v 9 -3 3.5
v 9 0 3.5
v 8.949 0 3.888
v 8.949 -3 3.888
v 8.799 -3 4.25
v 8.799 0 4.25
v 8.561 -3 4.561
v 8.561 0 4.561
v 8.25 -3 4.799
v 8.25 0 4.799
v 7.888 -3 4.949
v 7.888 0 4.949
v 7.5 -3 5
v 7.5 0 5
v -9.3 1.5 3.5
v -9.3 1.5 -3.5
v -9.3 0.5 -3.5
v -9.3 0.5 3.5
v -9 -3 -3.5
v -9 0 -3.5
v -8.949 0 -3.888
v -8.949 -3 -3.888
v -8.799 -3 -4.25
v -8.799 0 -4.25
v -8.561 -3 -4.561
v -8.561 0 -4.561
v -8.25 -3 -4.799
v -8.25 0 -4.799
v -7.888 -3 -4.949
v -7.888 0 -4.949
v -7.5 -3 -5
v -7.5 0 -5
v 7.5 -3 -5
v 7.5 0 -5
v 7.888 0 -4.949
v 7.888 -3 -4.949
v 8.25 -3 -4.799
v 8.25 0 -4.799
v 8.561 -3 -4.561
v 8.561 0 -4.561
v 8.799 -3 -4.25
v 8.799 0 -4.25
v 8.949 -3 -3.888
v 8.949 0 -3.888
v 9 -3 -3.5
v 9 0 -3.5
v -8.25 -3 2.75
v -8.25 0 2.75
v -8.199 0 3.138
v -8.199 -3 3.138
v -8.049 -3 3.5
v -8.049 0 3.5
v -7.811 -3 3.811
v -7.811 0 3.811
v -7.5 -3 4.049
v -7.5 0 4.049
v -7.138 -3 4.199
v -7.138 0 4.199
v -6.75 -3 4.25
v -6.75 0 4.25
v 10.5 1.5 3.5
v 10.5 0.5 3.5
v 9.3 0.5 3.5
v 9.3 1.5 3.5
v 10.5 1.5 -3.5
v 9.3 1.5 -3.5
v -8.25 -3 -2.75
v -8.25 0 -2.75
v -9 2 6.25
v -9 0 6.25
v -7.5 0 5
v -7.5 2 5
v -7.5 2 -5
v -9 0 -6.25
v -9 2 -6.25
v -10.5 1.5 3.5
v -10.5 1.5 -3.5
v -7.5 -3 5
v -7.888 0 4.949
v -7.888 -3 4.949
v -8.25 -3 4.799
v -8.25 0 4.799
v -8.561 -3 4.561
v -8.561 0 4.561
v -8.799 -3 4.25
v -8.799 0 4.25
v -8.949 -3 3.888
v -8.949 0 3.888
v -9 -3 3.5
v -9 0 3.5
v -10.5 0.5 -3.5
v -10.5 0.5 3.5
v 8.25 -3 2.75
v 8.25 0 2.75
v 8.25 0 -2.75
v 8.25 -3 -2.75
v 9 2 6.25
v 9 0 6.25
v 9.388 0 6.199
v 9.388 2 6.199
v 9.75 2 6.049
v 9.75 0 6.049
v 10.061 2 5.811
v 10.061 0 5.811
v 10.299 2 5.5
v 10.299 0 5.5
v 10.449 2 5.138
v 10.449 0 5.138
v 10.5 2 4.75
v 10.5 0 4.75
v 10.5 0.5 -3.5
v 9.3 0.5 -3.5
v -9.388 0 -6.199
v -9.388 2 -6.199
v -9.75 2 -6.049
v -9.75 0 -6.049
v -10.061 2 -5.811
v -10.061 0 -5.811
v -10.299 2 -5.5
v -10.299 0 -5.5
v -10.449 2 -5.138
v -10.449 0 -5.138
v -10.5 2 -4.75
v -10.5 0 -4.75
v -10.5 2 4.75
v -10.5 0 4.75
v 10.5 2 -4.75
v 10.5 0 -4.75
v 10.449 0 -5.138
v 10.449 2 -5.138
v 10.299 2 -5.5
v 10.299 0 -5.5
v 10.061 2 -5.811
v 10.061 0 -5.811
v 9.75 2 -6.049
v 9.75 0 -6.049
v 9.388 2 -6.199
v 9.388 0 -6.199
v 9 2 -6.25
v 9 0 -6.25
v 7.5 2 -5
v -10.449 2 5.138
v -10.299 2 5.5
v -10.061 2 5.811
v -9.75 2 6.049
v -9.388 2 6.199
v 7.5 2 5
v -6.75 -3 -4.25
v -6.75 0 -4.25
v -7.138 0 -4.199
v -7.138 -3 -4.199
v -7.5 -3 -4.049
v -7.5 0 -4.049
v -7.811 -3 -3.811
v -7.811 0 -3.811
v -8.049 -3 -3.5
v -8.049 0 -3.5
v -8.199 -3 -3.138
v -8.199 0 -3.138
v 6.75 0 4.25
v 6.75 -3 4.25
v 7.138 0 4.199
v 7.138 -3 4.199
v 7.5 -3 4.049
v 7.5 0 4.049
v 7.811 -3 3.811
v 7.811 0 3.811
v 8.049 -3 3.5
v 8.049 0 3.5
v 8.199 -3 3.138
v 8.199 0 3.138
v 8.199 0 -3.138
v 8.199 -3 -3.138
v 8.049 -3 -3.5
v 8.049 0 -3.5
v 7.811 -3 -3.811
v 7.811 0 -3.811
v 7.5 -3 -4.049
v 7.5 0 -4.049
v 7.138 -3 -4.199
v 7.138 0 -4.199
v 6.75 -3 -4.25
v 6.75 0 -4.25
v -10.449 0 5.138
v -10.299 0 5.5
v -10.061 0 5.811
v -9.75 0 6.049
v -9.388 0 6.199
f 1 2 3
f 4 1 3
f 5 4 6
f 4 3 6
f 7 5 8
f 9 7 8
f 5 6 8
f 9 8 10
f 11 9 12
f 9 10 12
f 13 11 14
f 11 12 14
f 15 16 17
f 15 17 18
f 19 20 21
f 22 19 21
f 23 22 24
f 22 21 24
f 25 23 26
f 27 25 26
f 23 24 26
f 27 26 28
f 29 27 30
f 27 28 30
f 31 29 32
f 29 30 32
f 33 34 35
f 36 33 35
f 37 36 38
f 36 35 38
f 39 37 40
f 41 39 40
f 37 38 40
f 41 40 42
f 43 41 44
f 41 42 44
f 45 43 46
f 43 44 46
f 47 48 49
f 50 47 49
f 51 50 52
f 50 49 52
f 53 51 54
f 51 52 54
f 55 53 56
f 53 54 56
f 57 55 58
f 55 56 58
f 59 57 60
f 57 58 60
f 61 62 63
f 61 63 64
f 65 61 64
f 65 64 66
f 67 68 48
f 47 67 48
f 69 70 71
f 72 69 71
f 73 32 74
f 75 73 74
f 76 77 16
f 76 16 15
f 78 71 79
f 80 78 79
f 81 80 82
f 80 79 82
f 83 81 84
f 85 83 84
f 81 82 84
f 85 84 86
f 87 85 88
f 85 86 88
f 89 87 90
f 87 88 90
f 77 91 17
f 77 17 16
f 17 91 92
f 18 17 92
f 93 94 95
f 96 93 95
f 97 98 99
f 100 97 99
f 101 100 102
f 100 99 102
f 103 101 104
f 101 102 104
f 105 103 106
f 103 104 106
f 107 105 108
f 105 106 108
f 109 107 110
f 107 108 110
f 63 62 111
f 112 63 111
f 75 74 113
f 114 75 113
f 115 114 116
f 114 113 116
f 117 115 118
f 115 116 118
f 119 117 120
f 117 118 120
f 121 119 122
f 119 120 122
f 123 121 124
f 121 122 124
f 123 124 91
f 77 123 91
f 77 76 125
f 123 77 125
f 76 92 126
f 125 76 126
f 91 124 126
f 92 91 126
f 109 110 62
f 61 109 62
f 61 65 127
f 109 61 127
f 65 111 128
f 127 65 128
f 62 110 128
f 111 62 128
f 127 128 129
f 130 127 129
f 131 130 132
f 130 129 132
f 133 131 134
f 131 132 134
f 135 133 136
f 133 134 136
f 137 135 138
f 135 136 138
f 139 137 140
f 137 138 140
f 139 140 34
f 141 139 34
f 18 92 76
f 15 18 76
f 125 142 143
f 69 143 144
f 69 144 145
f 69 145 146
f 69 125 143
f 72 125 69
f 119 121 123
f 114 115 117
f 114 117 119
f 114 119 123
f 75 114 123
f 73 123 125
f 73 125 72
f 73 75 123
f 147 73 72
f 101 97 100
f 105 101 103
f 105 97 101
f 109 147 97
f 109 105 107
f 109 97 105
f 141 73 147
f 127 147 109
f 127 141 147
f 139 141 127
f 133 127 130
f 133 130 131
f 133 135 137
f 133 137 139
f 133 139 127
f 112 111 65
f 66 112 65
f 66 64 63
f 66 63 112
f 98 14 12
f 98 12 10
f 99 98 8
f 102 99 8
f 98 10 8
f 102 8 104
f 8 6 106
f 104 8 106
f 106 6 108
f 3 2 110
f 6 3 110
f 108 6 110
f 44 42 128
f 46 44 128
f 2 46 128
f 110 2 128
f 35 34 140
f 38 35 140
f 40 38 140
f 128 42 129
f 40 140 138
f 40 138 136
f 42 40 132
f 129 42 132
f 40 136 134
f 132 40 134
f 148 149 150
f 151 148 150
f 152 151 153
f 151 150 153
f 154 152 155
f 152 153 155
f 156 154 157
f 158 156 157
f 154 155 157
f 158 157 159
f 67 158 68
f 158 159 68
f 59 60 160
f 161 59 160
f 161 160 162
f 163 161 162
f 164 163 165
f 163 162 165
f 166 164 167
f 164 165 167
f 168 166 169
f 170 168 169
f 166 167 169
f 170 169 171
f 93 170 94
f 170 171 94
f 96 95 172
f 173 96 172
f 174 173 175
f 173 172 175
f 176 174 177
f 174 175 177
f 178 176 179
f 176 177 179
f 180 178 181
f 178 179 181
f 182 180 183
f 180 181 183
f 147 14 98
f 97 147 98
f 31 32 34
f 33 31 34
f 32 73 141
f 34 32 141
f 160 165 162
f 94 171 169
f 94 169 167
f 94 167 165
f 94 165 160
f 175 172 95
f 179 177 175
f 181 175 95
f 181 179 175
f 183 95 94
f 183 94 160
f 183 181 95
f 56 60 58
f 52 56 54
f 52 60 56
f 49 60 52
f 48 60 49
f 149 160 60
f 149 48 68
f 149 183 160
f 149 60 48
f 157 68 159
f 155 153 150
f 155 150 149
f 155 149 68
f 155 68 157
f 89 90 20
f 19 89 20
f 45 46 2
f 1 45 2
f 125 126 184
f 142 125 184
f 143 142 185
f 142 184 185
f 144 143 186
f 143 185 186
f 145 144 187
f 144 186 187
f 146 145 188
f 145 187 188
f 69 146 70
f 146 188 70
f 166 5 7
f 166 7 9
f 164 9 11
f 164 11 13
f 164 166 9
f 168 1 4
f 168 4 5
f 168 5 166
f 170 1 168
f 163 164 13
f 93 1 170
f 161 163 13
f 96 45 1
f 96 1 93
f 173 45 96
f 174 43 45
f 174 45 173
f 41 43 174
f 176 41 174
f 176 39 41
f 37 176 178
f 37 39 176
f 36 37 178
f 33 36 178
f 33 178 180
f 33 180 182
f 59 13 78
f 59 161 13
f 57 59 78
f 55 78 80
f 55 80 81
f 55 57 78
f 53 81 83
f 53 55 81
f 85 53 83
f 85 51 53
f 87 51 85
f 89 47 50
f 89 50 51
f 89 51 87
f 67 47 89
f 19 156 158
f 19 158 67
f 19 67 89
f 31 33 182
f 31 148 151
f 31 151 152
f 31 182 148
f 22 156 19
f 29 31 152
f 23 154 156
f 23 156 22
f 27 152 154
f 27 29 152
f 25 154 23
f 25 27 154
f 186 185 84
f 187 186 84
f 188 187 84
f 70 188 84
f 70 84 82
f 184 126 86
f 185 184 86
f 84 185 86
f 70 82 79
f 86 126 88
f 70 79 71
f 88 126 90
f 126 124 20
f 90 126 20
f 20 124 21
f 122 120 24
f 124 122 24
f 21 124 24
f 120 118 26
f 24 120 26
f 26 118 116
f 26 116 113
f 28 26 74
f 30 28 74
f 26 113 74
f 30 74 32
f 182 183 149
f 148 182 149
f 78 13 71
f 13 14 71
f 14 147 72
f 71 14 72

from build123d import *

# Parameters (mm, degrees)
BOSS_EXTRUDE1_DEPTH      = 2
BOSS_EXTRUDE1_DEPTH_BACK = 3
BOSS_EXTRUDE2_DEPTH      = 2
BOSS_EXTRUDE3_DEPTH      = 2
SKETCH3_W                = 7
SKETCH3_H                = 1
CUT_EXTRUDE2_DEPTH       = 1.2
SKETCH4_W                = 7
SKETCH4_H                = 1
CUT_EXTRUDE3_DEPTH       = 1.2


with BuildPart() as part:
    # Sketch2 → Boss-Extrude1 (new, two sides: drawn at the far end of the back side and taken through both)
    with BuildSketch(Plane(origin=(0, 0, 0), x_dir=(1, 0, 0), z_dir=(0, 1, 0)).offset(-BOSS_EXTRUDE1_DEPTH_BACK)):
        with BuildLine():
            Line((7.5, 5), (-7.5, 5))
            ThreePointArc((-7.5, 5), (-8.560660172, 4.560660172), (-9, 3.5))
            Line((-9, 3.5), (-9, -3.5))
            ThreePointArc((-9, -3.5), (-8.560660172, -4.560660172), (-7.5, -5))
            Line((-7.5, -5), (7.5, -5))
            ThreePointArc((7.5, -5), (8.560660172, -4.560660172), (9, -3.5))
            Line((9, -3.5), (9, 3.5))
            ThreePointArc((9, 3.5), (8.560660172, 4.560660172), (7.5, 5))
        make_face()
        with BuildLine():
            Line((-6.75, 4.25), (6.75, 4.25))
            ThreePointArc((6.75, 4.25), (7.810660172, 3.810660172), (8.25, 2.75))
            Line((8.25, 2.75), (8.25, -2.75))
            ThreePointArc((8.25, -2.75), (7.810660172, -3.810660172), (6.75, -4.25))
            Line((6.75, -4.25), (-6.75, -4.25))
            ThreePointArc((-6.75, -4.25), (-7.810660172, -3.810660172), (-8.25, -2.75))
            Line((-8.25, -2.75), (-8.25, 2.75))
            ThreePointArc((-8.25, 2.75), (-7.810660172, 3.810660172), (-6.75, 4.25))
        make_face(mode=Mode.SUBTRACT)
    extrude(amount=BOSS_EXTRUDE1_DEPTH + BOSS_EXTRUDE1_DEPTH_BACK)

    # Sketch2<3> → Boss-Extrude2 (add)
    with BuildSketch(Plane(origin=(0, 0, 0), x_dir=(1, 0, 0), z_dir=(0, 1, 0))):
        with BuildLine():
            ThreePointArc((8.25, 2.75), (7.810660172, 3.810660172), (6.75, 4.25))
            Line((6.75, 4.25), (-6.75, 4.25))
            ThreePointArc((-6.75, 4.25), (-7.810660172, 3.810660172), (-8.25, 2.75))
            Line((-8.25, 2.75), (-8.25, -2.75))
            ThreePointArc((-8.25, -2.75), (-7.810660172, -3.810660172), (-6.75, -4.25))
            Line((-6.75, -4.25), (6.75, -4.25))
            ThreePointArc((6.75, -4.25), (7.810660172, -3.810660172), (8.25, -2.75))
            Line((8.25, -2.75), (8.25, 2.75))
        make_face()
    extrude(amount=BOSS_EXTRUDE2_DEPTH)

    # Sketch2<4> → Boss-Extrude3 (add)
    with BuildSketch(Plane(origin=(0, 0, 0), x_dir=(1, 0, 0), z_dir=(0, 1, 0))):
        with BuildLine():
            Line((-7.5, 5), (-9, 6.25))
            ThreePointArc((-9, 6.25), (-10.060660172, 5.810660172), (-10.5, 4.75))
            Line((-10.5, 4.75), (-10.5, -4.75))
            ThreePointArc((-10.5, -4.75), (-10.060660172, -5.810660172), (-9, -6.25))
            Line((-9, -6.25), (-7.5, -5))
            ThreePointArc((-7.5, -5), (-8.560660172, -4.560660172), (-9, -3.5))
            Line((-9, -3.5), (-9, 3.5))
            ThreePointArc((-9, 3.5), (-8.560660172, 4.560660172), (-7.5, 5))
        make_face()
        with BuildLine():
            Line((9, 6.25), (7.5, 5))
            ThreePointArc((7.5, 5), (8.560660172, 4.560660172), (9, 3.5))
            Line((9, 3.5), (9, -3.5))
            ThreePointArc((9, -3.5), (8.560660172, -4.560660172), (7.5, -5))
            Line((7.5, -5), (9, -6.25))
            ThreePointArc((9, -6.25), (10.060660172, -5.810660172), (10.5, -4.75))
            Line((10.5, -4.75), (10.5, 4.75))
            ThreePointArc((10.5, 4.75), (10.060660172, 5.810660172), (9, 6.25))
        make_face()
    extrude(amount=BOSS_EXTRUDE3_DEPTH)

    # Sketch3 → Cut-Extrude2 (cut)
    with BuildSketch(Plane.ZY.offset(10.5)):
        with Locations((0, 1)):
            Rectangle(SKETCH3_W, SKETCH3_H)
    extrude(amount=-CUT_EXTRUDE2_DEPTH, mode=Mode.SUBTRACT)

    # Sketch4 → Cut-Extrude3 (cut)
    with BuildSketch(Plane(origin=(10.5, 0, 0), x_dir=(0, 0, -1), z_dir=(1, 0, 0))):
        with Locations((0, 1)):
            Rectangle(SKETCH4_W, SKETCH4_H)
    extrude(amount=-CUT_EXTRUDE3_DEPTH, mode=Mode.SUBTRACT)


solid = part.part
